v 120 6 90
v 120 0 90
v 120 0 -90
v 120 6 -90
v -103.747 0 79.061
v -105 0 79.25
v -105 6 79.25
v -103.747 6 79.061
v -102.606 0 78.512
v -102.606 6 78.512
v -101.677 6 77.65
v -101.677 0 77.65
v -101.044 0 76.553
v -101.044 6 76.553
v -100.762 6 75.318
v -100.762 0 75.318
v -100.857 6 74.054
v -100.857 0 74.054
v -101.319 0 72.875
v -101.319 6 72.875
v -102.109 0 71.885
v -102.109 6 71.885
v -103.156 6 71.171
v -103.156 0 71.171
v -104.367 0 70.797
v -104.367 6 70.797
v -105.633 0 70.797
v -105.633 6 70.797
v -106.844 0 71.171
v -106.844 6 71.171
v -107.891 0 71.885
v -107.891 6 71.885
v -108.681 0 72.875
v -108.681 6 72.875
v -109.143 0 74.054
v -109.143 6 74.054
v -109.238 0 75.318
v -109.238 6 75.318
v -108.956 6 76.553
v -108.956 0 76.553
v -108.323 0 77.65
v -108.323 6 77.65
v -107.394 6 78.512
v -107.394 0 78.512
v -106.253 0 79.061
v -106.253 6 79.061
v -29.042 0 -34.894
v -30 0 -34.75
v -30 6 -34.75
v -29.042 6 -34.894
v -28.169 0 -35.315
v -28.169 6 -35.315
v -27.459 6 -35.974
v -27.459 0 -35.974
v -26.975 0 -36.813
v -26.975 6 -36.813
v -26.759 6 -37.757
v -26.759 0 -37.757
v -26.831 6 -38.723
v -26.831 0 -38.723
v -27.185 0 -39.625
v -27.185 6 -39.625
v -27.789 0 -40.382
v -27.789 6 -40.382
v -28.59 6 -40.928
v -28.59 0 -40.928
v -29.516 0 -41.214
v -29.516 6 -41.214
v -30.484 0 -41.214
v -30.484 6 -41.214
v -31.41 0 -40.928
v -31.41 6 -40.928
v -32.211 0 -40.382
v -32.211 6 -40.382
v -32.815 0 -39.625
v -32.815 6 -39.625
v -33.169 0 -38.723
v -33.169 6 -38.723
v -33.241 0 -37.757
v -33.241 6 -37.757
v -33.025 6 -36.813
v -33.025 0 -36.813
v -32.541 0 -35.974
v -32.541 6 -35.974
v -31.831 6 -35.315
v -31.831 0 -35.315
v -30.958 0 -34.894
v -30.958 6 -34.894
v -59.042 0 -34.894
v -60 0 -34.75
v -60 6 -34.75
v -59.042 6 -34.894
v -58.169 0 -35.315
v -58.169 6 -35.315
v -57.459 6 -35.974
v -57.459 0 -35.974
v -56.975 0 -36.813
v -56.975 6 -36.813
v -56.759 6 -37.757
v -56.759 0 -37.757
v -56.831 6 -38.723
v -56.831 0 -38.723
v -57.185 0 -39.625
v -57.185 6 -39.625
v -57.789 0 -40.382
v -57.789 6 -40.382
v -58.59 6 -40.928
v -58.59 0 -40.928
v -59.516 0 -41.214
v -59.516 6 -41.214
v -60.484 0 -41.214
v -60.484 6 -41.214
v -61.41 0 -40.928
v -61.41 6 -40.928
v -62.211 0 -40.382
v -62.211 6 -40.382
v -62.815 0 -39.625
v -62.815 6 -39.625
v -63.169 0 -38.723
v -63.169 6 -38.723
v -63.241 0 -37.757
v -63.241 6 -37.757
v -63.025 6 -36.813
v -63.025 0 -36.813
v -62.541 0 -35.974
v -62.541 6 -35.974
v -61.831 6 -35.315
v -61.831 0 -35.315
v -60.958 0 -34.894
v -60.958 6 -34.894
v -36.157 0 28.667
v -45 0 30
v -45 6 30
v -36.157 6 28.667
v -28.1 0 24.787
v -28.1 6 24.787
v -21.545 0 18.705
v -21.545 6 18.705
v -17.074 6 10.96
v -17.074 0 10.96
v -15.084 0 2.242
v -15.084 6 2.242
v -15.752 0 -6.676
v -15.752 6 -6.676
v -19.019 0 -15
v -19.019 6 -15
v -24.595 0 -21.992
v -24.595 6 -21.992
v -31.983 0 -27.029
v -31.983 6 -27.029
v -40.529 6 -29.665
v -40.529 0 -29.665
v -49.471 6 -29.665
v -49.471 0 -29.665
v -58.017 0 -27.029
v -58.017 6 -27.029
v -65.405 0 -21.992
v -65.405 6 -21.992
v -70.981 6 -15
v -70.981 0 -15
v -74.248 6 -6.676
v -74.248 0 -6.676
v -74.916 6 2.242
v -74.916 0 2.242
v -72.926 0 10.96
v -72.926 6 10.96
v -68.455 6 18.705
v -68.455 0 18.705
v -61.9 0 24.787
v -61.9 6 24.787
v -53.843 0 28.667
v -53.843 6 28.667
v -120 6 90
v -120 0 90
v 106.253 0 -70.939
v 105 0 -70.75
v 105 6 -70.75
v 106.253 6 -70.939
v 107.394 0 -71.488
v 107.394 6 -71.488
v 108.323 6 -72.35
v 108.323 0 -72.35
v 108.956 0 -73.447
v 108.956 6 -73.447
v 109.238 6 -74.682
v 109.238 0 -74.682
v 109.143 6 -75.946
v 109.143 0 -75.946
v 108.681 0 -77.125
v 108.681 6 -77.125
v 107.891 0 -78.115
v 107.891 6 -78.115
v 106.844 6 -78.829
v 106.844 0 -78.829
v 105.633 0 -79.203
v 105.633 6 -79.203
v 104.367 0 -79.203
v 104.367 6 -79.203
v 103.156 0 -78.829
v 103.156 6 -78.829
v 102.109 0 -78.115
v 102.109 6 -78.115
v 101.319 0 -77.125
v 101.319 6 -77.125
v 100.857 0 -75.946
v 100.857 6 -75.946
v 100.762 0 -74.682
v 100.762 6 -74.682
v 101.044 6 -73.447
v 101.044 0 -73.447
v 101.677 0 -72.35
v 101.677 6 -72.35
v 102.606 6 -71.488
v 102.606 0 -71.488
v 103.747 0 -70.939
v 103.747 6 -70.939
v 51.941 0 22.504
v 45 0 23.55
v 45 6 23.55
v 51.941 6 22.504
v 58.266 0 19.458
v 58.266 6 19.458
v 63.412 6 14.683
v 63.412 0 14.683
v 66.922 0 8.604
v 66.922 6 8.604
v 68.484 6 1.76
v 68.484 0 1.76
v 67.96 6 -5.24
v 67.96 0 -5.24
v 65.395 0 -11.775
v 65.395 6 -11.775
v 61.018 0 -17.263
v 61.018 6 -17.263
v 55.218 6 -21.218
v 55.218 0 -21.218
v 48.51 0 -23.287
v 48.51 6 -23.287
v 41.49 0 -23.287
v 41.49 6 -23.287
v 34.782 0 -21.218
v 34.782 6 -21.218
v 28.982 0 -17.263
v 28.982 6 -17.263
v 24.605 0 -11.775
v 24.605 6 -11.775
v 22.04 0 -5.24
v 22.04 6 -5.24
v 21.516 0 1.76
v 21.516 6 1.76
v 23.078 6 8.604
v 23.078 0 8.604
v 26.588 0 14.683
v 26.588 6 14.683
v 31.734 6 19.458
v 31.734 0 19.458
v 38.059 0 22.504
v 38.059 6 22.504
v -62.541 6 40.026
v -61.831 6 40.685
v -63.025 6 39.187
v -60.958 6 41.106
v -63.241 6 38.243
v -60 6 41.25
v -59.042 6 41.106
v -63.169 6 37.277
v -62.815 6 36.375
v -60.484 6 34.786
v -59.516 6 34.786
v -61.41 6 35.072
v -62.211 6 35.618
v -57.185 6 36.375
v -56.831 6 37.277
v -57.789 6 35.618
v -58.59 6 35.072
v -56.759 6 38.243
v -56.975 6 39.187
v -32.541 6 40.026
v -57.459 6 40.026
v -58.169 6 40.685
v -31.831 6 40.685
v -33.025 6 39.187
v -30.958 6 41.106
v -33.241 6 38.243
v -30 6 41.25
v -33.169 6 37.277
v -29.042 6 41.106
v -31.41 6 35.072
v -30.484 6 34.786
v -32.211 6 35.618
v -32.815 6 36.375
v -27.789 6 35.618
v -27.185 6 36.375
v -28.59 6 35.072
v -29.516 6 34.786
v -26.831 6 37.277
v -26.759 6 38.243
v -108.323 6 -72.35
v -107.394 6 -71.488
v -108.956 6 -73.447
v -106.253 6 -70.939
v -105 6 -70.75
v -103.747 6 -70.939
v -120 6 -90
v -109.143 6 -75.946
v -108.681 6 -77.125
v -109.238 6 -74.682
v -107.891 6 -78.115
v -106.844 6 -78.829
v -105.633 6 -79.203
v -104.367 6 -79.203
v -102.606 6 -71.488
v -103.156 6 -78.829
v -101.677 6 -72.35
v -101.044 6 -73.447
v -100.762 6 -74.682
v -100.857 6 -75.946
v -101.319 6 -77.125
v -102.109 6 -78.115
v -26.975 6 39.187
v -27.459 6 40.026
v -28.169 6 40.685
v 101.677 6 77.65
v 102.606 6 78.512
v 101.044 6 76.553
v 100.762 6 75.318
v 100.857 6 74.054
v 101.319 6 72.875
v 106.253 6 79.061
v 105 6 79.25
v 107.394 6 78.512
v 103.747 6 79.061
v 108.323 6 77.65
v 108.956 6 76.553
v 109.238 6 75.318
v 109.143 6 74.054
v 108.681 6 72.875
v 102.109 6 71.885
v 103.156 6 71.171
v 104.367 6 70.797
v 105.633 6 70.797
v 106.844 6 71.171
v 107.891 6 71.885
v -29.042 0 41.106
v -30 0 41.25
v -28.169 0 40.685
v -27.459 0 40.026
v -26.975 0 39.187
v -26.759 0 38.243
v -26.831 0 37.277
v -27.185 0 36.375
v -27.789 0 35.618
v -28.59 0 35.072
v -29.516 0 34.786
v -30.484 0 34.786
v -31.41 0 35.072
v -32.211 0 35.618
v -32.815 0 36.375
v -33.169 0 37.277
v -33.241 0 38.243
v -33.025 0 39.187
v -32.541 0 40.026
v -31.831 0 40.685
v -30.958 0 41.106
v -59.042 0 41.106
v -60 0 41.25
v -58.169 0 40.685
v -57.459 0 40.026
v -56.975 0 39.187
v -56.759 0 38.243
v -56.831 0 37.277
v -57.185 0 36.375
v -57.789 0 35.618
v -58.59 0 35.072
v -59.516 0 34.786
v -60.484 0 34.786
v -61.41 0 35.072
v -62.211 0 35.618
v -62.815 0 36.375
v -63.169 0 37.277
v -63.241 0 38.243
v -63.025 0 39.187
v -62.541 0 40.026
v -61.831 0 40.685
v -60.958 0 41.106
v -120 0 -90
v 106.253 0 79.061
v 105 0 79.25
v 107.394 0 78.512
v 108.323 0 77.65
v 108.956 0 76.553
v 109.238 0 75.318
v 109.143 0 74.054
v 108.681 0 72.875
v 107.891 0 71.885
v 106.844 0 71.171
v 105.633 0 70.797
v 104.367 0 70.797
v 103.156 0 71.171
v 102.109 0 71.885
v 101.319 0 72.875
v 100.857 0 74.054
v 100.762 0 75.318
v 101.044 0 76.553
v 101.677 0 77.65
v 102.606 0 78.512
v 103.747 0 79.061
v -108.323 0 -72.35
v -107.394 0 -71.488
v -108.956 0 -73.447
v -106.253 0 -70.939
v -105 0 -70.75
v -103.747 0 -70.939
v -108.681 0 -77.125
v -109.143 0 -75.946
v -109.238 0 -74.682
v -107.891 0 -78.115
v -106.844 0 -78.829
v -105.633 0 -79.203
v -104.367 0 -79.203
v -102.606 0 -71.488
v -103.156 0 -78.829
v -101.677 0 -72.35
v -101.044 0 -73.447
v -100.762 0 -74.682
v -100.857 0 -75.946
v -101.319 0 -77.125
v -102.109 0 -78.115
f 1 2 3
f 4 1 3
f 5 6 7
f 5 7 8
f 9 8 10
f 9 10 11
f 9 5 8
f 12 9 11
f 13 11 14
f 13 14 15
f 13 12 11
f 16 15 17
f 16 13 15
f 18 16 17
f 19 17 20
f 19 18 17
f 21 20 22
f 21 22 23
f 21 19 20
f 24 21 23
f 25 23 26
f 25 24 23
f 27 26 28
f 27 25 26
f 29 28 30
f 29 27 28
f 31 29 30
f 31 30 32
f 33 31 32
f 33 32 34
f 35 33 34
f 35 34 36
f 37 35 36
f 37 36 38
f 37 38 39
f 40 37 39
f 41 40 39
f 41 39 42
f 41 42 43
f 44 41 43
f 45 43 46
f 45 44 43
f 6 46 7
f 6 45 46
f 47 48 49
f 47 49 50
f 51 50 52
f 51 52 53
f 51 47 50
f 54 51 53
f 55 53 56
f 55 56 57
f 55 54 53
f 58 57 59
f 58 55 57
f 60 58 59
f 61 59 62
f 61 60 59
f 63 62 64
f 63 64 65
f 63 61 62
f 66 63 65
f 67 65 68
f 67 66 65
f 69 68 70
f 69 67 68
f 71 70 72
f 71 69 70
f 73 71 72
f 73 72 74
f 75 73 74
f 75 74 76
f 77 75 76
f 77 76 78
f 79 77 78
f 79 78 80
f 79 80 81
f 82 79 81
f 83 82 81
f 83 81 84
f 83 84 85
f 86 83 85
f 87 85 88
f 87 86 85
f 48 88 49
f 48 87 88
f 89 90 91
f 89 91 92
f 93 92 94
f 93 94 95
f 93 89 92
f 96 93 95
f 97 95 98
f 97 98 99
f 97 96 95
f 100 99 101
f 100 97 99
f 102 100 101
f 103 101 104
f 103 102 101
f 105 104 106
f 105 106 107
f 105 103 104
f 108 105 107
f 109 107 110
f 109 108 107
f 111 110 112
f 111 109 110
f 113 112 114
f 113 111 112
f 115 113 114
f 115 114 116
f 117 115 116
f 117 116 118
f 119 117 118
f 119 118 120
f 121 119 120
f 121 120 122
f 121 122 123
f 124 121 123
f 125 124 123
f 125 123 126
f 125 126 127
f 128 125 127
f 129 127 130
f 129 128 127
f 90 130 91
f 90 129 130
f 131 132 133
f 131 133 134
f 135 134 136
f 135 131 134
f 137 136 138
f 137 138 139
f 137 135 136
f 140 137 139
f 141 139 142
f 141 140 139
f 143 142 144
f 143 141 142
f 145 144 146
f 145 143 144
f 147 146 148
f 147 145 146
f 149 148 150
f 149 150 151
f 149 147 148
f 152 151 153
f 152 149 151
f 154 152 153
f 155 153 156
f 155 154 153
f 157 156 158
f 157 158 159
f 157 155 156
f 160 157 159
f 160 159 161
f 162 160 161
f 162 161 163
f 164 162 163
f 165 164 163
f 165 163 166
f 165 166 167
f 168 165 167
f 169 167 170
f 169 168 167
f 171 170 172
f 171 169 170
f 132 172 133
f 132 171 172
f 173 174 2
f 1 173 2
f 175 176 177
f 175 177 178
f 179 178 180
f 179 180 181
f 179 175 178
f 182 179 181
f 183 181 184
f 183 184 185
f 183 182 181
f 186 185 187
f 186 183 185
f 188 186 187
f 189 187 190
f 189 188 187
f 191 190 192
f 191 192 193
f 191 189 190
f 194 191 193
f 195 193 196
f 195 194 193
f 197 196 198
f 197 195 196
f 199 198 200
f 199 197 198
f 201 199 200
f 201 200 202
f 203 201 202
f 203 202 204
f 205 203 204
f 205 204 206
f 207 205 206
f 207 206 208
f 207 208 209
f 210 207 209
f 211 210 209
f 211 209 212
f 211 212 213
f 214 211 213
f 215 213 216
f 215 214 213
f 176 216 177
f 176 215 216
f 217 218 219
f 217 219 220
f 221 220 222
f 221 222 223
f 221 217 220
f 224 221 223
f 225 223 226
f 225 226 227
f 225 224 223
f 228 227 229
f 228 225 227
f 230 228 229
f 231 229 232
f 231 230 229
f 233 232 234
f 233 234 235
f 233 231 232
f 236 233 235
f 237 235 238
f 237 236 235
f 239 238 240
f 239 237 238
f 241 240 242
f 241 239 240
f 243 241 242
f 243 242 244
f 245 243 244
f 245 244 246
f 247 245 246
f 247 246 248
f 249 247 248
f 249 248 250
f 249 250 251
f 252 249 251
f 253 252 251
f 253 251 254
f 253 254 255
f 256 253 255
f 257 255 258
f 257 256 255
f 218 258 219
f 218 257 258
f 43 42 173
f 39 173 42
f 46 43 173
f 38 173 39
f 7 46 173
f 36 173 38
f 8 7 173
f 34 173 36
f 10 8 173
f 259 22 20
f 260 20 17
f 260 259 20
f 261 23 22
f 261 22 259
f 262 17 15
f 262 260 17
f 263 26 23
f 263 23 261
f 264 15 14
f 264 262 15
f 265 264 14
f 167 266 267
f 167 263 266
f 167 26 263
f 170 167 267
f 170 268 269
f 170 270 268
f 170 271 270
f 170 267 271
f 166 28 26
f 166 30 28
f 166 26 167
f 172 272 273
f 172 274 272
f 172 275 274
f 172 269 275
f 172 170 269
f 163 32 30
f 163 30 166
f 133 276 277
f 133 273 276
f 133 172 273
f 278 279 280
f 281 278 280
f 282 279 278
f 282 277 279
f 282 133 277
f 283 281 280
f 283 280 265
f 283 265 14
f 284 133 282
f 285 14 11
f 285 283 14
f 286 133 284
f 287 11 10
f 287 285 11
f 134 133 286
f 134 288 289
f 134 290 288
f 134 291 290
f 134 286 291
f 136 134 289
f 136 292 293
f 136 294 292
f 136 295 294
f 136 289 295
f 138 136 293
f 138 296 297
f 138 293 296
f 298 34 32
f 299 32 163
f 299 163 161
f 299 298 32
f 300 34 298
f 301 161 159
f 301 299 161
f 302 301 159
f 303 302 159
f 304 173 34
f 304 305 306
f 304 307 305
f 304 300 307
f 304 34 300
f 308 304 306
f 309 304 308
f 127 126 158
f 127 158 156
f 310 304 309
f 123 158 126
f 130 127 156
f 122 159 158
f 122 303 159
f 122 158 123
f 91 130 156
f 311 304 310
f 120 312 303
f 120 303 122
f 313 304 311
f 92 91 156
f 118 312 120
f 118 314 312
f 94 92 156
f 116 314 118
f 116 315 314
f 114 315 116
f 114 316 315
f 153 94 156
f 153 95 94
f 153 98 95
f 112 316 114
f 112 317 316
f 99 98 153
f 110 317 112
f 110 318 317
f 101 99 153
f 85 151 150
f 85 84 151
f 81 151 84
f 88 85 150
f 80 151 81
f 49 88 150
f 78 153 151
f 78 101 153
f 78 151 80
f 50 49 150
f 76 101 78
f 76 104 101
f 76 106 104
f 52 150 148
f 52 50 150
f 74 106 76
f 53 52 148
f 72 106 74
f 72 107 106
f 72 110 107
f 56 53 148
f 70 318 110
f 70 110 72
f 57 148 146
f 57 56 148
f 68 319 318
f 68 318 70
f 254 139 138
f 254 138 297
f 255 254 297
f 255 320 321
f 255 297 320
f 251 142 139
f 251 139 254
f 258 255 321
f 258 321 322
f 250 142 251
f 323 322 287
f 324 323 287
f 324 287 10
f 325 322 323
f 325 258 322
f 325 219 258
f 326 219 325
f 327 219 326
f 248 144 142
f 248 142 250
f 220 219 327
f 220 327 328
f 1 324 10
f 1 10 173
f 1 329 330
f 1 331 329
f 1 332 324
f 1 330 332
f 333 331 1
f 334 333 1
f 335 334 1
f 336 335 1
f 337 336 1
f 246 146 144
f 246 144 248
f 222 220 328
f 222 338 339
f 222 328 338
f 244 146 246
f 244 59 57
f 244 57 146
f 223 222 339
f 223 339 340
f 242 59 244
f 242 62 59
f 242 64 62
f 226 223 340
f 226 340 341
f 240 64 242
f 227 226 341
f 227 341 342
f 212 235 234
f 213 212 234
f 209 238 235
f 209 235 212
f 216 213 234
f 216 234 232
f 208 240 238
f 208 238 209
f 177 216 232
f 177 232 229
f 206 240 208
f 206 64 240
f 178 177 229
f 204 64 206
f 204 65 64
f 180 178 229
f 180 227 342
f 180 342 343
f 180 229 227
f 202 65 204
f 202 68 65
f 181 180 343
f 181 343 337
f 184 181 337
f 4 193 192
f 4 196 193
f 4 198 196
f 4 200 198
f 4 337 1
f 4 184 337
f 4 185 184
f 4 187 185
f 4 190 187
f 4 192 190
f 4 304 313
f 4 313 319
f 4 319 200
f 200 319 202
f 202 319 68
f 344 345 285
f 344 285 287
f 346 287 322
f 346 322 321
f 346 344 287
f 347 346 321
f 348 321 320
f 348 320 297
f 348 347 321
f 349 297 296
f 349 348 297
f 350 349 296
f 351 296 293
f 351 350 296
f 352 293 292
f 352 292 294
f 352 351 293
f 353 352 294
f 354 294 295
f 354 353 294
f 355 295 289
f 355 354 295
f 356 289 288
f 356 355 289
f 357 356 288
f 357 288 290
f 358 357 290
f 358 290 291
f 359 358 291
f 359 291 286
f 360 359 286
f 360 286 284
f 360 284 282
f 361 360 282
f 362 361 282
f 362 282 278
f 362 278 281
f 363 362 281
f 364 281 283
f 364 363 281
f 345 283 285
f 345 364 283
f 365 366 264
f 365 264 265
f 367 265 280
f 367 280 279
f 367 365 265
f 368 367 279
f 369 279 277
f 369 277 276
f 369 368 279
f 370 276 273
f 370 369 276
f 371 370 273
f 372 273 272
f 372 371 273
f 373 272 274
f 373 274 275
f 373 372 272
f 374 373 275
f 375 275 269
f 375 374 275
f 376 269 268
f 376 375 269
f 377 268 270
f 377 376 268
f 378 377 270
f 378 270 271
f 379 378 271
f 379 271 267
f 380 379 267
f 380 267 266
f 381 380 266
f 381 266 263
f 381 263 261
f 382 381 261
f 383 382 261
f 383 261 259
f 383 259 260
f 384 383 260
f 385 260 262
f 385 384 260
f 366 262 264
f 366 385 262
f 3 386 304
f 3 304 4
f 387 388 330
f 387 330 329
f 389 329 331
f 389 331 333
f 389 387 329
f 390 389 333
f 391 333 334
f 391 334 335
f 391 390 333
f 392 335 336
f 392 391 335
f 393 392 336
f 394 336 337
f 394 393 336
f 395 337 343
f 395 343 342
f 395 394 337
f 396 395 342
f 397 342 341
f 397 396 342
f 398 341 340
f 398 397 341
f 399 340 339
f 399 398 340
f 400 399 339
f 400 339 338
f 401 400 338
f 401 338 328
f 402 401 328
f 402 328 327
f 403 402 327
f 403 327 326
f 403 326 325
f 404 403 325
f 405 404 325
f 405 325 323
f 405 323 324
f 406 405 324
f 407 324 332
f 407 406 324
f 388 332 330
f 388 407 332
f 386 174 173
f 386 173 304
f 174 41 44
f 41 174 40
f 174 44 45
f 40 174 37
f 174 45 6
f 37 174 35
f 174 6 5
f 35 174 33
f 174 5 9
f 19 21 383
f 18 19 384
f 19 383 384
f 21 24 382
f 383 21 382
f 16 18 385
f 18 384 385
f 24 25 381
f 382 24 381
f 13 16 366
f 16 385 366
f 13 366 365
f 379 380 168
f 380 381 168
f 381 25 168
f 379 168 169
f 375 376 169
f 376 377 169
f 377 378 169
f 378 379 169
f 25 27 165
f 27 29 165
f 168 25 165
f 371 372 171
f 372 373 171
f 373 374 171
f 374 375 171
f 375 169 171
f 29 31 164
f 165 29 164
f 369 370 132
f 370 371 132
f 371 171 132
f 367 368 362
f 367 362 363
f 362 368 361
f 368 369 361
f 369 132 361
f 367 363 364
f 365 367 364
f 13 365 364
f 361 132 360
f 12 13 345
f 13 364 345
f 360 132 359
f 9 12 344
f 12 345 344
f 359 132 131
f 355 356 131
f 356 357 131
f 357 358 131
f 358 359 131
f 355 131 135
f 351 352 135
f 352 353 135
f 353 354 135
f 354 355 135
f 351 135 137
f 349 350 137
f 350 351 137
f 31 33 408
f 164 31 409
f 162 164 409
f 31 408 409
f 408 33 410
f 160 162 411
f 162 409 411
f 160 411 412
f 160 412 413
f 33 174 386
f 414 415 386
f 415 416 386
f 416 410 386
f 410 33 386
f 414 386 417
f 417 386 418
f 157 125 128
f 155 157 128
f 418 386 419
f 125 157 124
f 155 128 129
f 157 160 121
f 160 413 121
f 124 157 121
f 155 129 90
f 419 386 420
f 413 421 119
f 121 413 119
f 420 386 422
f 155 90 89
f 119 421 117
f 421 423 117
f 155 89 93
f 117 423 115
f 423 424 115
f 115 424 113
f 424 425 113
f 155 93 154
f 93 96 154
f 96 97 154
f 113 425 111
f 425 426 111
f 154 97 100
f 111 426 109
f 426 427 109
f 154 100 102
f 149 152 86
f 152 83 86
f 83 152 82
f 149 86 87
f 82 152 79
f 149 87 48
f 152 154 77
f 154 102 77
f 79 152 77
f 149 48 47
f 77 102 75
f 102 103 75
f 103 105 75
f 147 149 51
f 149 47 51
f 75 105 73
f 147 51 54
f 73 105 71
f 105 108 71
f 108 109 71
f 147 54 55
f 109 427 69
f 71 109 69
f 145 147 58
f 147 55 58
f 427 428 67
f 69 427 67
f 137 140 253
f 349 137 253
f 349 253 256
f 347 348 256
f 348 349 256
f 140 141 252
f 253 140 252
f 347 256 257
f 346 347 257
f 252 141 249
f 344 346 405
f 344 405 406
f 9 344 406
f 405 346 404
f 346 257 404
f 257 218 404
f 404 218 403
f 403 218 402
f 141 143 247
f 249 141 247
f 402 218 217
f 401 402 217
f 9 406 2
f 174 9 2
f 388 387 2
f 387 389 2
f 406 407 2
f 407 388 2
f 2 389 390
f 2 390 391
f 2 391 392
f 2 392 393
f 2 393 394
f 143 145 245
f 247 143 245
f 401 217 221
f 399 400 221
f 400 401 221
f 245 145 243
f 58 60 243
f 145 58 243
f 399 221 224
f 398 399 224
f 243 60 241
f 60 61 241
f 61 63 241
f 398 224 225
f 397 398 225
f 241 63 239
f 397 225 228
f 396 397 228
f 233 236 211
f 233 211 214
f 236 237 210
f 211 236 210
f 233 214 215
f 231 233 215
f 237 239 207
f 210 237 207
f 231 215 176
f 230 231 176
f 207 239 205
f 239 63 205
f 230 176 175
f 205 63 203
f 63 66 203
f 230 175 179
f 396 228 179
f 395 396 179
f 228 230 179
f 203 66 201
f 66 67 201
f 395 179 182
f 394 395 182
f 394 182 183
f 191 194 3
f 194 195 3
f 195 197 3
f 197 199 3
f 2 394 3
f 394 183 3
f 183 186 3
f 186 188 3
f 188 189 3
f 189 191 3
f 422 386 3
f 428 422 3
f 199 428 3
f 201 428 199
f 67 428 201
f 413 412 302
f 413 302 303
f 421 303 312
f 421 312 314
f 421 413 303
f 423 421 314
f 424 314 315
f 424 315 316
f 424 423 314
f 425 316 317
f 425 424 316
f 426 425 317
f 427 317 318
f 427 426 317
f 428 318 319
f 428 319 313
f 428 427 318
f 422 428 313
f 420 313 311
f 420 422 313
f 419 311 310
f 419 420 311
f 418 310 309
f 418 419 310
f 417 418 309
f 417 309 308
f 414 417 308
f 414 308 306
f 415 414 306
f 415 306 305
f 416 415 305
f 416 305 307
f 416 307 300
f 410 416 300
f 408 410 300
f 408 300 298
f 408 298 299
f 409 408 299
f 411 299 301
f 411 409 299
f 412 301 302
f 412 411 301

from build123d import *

# Parameters (mm, degrees)
SKETCH1_W           = 240
SKETCH1_H           = 180
SKETCH1_R           = 23.55
SKETCH1_R_2         = 30
SKETCH1_R_3         = 4.25
SKETCH1_R_4         = 3.25
PLATE_EXTRUDE_DEPTH = 6


with BuildPart() as part:
    # Sketch1 → Plate_Extrude (new body)
    with BuildSketch(Plane(origin=(0, 0, 0), x_dir=(1, 0, 0), z_dir=(0, 1, 0))):
        Rectangle(SKETCH1_W, SKETCH1_H)
        with Locations(Location((45, 0, 0), (0, 0, 270))):
            Circle(SKETCH1_R, mode=Mode.SUBTRACT)
        with Locations(Location((-45, 0, 0), (0, 0, 270))):
            Circle(SKETCH1_R_2, mode=Mode.SUBTRACT)
        with Locations(Location((-105, -75, 0), (0, 0, 270))):
            Circle(SKETCH1_R_3, mode=Mode.SUBTRACT)
        with Locations(Location((105, -75, 0), (0, 0, 270))):
            Circle(SKETCH1_R_3, mode=Mode.SUBTRACT)
        with Locations(Location((-105, 75, 0), (0, 0, 270))):
            Circle(SKETCH1_R_3, mode=Mode.SUBTRACT)
        with Locations(Location((105, 75, 0), (0, 0, 270))):
            Circle(SKETCH1_R_3, mode=Mode.SUBTRACT)
        with Locations(Location((-60, -38, 0), (0, 0, 270))):
            Circle(SKETCH1_R_4, mode=Mode.SUBTRACT)
        with Locations(Location((-60, 38, 0), (0, 0, 270))):
            Circle(SKETCH1_R_4, mode=Mode.SUBTRACT)
        with Locations(Location((-30, -38, 0), (0, 0, 270))):
            Circle(SKETCH1_R_4, mode=Mode.SUBTRACT)
        with Locations(Location((-30, 38, 0), (0, 0, 270))):
            Circle(SKETCH1_R_4, mode=Mode.SUBTRACT)
    extrude(amount=PLATE_EXTRUDE_DEPTH)


solid = part.part
